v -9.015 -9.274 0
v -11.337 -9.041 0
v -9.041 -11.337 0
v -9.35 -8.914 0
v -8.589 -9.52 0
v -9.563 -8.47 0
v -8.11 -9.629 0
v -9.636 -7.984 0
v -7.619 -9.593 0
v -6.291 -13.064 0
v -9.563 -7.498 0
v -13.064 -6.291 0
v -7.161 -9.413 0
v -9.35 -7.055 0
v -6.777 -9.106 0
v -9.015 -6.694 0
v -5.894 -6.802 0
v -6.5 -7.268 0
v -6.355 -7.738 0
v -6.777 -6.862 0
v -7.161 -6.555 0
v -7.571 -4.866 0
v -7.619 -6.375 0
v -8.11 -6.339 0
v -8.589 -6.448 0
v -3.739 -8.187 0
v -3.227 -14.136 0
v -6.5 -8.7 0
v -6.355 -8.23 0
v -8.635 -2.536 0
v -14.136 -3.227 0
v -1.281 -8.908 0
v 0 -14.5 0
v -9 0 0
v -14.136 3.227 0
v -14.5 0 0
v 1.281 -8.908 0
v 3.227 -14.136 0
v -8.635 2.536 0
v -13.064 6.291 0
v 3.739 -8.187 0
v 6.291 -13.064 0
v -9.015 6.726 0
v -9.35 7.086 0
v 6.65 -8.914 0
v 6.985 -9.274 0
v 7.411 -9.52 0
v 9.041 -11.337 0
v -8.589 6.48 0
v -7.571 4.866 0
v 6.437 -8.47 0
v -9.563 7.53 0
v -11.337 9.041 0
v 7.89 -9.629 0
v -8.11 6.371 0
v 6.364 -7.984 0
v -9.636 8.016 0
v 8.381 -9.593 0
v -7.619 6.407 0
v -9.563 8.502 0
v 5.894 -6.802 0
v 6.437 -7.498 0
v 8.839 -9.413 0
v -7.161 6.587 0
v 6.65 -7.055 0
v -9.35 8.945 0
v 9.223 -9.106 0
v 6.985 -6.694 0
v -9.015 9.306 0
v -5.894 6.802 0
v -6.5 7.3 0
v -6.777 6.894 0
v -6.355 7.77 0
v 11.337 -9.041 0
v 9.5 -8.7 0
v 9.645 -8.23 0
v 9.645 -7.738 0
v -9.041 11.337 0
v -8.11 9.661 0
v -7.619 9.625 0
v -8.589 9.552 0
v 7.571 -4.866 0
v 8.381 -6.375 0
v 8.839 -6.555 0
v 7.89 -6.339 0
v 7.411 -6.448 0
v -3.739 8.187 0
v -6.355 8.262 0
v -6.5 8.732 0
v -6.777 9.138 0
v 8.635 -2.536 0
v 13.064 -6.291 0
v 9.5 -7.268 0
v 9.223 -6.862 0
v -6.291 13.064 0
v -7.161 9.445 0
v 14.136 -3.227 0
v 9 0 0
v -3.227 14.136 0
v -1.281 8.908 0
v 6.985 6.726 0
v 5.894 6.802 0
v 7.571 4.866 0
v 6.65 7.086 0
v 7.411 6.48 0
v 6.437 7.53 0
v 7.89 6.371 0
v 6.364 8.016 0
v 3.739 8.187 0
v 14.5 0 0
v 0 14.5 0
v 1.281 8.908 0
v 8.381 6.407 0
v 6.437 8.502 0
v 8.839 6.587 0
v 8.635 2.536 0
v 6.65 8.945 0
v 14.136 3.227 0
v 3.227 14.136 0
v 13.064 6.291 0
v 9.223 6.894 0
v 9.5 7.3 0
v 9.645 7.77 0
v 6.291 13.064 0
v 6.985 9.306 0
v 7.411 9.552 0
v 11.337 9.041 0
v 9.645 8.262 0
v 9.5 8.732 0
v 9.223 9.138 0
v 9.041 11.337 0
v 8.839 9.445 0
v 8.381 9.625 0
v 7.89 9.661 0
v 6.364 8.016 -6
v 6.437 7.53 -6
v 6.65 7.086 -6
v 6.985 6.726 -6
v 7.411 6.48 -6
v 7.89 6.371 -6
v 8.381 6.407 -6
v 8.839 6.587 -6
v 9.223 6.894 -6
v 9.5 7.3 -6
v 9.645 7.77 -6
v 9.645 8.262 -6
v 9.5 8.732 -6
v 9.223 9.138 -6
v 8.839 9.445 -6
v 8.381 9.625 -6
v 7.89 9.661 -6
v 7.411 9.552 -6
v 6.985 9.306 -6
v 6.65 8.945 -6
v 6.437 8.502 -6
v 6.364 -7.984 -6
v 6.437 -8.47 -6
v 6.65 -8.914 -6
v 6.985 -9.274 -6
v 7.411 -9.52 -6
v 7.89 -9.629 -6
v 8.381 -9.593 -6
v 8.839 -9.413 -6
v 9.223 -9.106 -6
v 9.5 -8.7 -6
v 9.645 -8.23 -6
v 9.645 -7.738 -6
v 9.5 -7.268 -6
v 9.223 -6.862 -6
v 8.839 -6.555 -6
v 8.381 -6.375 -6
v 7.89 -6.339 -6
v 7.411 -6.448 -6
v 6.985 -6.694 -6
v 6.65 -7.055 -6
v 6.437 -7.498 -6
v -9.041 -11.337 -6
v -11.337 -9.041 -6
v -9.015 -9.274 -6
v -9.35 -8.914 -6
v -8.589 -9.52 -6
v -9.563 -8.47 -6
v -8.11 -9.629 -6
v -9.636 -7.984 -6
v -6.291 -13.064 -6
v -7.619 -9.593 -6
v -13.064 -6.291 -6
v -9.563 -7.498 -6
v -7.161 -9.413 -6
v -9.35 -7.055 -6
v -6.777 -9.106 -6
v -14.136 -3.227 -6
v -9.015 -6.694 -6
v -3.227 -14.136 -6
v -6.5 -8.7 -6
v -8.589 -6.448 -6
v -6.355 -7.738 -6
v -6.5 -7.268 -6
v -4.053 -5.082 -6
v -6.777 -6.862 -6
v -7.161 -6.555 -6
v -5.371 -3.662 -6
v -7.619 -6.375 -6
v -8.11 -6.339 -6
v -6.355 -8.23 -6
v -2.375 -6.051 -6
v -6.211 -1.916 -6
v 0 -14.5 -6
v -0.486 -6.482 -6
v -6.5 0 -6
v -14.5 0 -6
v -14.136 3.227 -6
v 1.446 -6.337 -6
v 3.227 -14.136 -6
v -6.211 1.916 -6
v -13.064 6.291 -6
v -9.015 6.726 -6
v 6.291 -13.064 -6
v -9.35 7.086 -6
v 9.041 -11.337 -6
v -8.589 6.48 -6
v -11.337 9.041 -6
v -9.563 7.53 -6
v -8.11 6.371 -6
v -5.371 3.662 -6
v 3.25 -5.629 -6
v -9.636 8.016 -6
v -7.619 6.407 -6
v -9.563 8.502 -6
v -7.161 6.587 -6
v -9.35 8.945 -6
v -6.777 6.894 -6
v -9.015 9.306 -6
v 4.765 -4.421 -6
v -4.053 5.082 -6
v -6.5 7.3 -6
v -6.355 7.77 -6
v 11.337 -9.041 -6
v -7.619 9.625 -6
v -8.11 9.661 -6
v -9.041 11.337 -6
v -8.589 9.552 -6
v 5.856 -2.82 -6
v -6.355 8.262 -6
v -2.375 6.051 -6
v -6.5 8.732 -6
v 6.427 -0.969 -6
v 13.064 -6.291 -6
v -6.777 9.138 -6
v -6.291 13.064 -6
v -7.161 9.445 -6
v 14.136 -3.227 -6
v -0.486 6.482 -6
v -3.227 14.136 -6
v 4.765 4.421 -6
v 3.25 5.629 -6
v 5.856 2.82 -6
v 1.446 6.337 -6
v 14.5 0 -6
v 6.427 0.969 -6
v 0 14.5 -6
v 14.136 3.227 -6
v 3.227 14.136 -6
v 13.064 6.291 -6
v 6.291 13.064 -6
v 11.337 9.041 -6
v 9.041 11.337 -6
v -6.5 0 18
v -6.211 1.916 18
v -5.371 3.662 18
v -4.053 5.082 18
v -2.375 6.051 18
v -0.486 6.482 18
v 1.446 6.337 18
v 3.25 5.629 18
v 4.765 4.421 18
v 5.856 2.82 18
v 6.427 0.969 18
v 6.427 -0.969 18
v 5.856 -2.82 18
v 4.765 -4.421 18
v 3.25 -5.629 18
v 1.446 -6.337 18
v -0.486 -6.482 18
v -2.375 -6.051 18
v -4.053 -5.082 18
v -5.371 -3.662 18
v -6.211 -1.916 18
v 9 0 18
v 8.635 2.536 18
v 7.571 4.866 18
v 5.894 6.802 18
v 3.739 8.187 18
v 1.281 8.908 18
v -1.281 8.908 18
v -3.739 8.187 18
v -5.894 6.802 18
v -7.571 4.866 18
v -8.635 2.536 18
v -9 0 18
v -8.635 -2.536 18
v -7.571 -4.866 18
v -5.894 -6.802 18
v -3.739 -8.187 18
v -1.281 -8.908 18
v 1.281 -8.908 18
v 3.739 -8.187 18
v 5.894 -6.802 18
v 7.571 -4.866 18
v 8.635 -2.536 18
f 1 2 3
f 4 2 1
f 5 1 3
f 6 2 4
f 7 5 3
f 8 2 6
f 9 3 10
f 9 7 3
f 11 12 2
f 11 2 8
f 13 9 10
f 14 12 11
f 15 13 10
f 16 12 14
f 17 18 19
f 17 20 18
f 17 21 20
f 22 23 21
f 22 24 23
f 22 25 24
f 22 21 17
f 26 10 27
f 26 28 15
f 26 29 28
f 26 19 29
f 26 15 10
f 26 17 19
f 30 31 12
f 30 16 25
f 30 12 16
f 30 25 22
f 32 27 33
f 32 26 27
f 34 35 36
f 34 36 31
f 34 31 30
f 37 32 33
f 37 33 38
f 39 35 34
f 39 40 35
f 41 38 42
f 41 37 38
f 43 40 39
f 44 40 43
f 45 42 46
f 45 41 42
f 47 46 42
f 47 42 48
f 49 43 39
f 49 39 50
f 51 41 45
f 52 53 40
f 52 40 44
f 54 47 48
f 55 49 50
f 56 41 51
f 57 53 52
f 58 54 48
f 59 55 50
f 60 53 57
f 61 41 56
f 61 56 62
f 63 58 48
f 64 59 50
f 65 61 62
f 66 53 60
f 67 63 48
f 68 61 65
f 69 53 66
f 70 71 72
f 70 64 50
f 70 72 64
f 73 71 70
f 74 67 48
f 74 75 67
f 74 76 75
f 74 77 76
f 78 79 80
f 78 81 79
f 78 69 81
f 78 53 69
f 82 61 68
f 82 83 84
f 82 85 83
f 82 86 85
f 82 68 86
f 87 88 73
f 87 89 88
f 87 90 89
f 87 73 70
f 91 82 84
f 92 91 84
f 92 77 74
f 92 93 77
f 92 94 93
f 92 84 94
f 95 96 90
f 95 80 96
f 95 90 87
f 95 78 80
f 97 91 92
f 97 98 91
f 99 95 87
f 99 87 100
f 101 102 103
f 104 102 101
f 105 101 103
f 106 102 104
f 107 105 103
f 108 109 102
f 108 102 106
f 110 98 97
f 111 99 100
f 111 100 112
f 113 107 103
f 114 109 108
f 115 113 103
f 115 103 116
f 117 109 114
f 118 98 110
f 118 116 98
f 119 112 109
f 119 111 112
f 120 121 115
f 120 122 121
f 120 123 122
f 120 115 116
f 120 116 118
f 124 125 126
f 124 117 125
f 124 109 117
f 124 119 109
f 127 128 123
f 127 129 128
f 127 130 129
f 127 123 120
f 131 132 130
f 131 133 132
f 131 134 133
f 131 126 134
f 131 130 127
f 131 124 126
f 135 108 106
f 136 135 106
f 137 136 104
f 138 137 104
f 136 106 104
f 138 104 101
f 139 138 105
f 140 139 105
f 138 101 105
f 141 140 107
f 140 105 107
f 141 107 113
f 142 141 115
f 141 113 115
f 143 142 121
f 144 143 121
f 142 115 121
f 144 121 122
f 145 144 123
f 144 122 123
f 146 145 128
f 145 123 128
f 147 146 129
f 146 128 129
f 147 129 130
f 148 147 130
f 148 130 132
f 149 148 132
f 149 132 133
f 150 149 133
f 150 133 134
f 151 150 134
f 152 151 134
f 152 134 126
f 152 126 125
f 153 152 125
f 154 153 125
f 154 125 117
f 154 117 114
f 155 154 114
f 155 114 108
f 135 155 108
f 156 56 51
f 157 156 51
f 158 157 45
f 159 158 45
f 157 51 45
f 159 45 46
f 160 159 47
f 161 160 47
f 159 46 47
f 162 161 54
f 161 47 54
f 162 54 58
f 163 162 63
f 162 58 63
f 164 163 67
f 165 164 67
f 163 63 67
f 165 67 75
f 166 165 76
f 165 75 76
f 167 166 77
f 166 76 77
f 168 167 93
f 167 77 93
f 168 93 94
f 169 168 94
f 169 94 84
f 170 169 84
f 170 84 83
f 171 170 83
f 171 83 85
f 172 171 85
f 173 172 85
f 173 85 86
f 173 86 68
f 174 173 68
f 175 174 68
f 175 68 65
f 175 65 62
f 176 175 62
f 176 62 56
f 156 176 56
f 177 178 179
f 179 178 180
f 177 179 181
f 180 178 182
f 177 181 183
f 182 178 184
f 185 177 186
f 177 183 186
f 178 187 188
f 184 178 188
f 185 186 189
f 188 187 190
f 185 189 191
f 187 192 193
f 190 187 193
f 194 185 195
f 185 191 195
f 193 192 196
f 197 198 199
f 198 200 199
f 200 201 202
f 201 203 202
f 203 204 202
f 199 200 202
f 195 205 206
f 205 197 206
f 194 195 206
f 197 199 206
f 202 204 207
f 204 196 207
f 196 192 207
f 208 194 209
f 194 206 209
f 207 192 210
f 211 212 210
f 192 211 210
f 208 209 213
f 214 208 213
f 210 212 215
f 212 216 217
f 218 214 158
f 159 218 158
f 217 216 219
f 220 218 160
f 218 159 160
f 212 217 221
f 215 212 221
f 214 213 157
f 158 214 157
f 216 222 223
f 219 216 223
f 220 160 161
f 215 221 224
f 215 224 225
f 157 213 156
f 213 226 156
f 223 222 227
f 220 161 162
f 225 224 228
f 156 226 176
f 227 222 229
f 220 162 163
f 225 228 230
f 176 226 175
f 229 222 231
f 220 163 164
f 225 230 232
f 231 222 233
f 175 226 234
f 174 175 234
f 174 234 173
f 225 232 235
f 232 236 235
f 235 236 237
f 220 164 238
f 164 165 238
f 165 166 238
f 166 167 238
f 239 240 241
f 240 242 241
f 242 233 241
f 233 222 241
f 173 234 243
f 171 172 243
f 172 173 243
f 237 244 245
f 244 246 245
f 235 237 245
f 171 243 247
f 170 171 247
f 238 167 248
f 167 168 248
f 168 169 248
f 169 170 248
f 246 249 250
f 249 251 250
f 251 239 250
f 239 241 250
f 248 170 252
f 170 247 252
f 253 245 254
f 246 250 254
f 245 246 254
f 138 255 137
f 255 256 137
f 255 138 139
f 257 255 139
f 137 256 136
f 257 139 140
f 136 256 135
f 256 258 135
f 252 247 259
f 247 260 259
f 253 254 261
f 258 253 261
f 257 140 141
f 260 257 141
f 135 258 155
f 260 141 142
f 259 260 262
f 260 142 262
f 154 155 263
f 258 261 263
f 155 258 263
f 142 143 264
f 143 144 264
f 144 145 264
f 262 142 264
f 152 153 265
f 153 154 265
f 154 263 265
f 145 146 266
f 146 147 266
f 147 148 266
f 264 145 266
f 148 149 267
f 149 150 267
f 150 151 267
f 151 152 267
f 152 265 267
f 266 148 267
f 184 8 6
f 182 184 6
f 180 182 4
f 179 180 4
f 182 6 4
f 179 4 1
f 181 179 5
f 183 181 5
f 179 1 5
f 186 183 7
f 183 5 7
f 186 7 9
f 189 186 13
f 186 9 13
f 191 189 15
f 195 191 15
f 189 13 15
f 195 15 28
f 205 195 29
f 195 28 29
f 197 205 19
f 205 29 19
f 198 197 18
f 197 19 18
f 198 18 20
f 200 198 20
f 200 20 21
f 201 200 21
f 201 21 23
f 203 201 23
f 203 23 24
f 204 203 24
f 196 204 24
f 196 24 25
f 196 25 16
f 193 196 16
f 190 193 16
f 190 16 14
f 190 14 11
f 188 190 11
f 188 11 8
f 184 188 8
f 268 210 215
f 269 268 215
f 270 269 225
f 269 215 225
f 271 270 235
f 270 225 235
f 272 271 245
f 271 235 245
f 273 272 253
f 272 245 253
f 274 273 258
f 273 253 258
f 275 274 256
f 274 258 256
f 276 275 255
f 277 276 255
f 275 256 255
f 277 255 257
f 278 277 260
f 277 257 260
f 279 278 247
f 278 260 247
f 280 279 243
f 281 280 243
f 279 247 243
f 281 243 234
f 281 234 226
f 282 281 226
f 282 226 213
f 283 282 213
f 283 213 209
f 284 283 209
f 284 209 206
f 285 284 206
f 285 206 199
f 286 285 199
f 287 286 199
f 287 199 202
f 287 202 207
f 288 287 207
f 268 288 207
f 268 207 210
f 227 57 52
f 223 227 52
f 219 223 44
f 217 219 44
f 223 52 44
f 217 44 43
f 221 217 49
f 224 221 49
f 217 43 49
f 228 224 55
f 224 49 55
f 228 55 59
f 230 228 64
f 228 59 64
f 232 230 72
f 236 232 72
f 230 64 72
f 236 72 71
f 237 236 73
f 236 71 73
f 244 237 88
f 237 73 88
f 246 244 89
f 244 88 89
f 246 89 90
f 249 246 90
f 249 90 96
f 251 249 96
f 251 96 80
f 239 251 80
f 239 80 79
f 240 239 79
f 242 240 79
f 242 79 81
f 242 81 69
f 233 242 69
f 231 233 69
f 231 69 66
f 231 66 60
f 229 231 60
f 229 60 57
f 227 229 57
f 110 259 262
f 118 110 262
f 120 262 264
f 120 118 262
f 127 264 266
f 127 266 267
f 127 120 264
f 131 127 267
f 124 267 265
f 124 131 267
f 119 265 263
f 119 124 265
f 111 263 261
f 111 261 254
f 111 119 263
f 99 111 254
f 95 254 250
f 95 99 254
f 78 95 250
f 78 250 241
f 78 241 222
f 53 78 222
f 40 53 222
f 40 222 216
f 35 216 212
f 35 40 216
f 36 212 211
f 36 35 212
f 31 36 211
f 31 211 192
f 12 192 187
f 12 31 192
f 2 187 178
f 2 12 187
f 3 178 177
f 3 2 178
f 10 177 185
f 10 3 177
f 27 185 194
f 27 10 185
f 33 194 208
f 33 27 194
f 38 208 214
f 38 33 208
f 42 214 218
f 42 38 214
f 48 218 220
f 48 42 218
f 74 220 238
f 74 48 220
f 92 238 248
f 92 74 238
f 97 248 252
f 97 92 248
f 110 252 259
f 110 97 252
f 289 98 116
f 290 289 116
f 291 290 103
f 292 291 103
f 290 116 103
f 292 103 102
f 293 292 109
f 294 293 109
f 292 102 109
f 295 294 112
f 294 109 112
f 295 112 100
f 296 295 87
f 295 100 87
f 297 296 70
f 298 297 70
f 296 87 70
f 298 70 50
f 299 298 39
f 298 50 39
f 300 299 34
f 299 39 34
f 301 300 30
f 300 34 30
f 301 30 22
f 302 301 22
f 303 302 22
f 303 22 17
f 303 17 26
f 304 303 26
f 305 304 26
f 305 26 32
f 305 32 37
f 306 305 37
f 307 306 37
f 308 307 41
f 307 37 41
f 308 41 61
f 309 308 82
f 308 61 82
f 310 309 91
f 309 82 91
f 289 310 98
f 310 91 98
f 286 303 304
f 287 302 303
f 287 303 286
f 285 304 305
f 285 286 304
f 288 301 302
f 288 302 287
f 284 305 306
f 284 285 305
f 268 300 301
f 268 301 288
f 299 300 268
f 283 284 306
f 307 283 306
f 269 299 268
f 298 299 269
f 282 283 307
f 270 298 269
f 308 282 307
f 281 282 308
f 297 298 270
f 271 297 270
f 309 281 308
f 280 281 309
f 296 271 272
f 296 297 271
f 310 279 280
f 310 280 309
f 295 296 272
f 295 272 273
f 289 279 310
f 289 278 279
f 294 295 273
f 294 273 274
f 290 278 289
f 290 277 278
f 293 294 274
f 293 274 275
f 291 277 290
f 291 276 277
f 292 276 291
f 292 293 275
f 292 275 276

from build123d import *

# Parameters (mm, degrees)
F0_R     = 14.5
F0_R_2   = 9
F1_DEPTH = 6
F2_DEPTH = 18
F4_D     = 13
F6_D     = 3.3


with BuildPart() as f1:
    # F0 (on Top) → F1 (new body)
    with BuildSketch(Plane.XY):
        Circle(F0_R)
        Circle(F0_R_2, mode=Mode.SUBTRACT)
        Circle(F0_R_2)
    extrude(amount=-F1_DEPTH)

    # F0 (on Top) → F2 (join)
    with BuildSketch(Plane.XY):
        Circle(F0_R_2)
    extrude(amount=F2_DEPTH)

    # F4 (through all)
    with Locations(Plane.XY.offset(18)):
        with Locations((0, 0)):
            Hole(F4_D / 2)

    # F6 (through all)
    with Locations(Plane(origin=(0, 0, -6), x_dir=(1, 0, 0), z_dir=(0, 0, -1))):
        with Locations((8.0136820347, 7.9841035315), (8.0136820347, -8.0158964685), (-7.9863179653, -8.0158964685), (-7.9863179653, 7.9841035315)):
            Hole(F6_D / 2)


solid = f1.part
